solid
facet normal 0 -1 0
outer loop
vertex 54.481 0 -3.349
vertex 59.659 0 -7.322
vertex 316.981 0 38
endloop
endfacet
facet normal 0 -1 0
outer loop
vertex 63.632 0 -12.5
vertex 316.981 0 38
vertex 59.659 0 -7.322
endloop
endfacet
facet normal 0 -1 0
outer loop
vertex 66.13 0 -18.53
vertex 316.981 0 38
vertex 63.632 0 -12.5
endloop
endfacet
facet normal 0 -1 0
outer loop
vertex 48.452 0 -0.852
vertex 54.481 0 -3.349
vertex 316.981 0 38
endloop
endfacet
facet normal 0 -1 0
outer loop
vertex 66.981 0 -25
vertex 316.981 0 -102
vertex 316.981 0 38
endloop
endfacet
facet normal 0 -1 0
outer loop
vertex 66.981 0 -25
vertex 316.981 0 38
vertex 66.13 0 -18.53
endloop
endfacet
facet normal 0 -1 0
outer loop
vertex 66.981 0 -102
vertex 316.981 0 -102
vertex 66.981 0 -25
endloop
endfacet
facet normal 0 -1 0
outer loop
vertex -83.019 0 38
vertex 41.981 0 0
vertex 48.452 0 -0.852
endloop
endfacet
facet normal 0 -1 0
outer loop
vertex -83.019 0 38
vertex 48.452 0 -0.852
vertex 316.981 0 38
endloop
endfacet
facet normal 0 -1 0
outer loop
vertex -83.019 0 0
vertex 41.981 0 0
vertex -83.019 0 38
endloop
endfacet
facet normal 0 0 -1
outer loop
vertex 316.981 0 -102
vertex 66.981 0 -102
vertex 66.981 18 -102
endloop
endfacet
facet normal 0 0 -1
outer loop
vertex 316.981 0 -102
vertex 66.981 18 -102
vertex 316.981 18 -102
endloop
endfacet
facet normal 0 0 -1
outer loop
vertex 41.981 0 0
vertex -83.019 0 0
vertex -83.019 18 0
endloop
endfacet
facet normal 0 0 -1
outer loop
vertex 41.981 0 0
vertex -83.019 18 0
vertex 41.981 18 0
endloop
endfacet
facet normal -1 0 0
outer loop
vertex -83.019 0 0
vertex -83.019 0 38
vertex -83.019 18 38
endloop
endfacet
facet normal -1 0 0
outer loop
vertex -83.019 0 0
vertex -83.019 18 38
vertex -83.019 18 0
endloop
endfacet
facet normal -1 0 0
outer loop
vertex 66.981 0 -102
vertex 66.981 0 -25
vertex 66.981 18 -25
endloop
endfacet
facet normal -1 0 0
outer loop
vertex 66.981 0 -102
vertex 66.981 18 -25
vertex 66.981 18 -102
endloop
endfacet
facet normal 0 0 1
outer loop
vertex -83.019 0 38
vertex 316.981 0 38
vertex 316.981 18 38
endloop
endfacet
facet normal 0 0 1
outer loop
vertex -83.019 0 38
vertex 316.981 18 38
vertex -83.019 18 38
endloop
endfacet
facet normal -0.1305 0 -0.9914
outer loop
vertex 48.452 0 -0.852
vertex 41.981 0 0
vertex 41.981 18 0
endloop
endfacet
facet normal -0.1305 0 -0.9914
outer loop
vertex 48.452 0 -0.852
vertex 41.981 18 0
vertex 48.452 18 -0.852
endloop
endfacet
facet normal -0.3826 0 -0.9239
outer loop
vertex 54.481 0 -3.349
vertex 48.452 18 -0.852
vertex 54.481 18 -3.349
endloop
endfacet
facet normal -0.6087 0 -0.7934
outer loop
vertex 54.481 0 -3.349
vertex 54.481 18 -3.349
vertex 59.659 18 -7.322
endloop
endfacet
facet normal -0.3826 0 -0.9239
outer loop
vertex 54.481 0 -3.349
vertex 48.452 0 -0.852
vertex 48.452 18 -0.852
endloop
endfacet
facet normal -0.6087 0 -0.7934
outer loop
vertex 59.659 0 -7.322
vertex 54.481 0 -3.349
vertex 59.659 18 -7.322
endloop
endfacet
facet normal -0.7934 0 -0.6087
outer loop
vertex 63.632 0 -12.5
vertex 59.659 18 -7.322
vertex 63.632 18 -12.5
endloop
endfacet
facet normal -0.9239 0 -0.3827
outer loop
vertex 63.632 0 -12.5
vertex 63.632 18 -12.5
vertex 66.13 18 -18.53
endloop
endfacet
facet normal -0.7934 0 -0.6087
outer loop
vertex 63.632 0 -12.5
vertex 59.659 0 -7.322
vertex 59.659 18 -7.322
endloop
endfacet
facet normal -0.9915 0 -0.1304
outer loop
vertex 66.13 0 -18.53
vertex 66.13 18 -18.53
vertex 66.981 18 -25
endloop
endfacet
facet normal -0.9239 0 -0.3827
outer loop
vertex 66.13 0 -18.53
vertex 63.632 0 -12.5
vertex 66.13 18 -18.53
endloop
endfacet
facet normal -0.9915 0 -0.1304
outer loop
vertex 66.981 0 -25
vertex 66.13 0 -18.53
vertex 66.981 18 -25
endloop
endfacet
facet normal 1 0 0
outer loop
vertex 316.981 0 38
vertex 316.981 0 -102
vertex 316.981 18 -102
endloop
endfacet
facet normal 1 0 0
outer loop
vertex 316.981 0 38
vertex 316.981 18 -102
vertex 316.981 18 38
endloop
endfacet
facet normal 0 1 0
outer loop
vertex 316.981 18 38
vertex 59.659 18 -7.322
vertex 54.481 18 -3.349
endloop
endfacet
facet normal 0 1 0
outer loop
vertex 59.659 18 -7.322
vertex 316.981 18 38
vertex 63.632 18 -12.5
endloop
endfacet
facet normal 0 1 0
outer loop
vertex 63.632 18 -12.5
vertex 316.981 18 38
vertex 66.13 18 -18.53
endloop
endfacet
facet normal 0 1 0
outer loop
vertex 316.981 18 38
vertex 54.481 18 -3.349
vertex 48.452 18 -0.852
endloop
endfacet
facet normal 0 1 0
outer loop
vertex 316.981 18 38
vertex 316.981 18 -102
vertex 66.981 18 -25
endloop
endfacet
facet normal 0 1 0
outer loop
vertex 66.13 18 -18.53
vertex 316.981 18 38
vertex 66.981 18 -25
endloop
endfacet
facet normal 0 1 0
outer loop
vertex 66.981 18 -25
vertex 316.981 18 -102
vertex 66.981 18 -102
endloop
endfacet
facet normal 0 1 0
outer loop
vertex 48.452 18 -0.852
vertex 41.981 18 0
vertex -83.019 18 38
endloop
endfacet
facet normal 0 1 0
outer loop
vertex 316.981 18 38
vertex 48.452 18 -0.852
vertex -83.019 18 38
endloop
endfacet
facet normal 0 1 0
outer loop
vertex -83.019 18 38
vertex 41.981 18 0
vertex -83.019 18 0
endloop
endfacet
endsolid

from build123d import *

# Parameters (mm, degrees)
BOSS_EXTRUDE1_DEPTH = 18


with BuildPart() as part:
    # Sketch1 → Boss-Extrude1 (new body)
    with BuildSketch(Plane(origin=(0, 0, 0), x_dir=(1, 0, 0), z_dir=(0, 1, 0))):
        with BuildLine():
            Line((66.981499187, 102), (316.981499187, 102))
            Line((316.981499187, 102), (316.981499187, -38))
            Line((316.981499187, -38), (-83.018500813, -38))
            Line((-83.018500813, -38), (-83.018500813, 0))
            Line((-83.018500813, 0), (41.981499187, 0))
            ThreePointArc((41.981499187, 0), (59.659168717, 7.32233047), (66.981499187, 25))
            Line((66.981499187, 25), (66.981499187, 102))
        make_face()
    extrude(amount=BOSS_EXTRUDE1_DEPTH)


solid = part.part
